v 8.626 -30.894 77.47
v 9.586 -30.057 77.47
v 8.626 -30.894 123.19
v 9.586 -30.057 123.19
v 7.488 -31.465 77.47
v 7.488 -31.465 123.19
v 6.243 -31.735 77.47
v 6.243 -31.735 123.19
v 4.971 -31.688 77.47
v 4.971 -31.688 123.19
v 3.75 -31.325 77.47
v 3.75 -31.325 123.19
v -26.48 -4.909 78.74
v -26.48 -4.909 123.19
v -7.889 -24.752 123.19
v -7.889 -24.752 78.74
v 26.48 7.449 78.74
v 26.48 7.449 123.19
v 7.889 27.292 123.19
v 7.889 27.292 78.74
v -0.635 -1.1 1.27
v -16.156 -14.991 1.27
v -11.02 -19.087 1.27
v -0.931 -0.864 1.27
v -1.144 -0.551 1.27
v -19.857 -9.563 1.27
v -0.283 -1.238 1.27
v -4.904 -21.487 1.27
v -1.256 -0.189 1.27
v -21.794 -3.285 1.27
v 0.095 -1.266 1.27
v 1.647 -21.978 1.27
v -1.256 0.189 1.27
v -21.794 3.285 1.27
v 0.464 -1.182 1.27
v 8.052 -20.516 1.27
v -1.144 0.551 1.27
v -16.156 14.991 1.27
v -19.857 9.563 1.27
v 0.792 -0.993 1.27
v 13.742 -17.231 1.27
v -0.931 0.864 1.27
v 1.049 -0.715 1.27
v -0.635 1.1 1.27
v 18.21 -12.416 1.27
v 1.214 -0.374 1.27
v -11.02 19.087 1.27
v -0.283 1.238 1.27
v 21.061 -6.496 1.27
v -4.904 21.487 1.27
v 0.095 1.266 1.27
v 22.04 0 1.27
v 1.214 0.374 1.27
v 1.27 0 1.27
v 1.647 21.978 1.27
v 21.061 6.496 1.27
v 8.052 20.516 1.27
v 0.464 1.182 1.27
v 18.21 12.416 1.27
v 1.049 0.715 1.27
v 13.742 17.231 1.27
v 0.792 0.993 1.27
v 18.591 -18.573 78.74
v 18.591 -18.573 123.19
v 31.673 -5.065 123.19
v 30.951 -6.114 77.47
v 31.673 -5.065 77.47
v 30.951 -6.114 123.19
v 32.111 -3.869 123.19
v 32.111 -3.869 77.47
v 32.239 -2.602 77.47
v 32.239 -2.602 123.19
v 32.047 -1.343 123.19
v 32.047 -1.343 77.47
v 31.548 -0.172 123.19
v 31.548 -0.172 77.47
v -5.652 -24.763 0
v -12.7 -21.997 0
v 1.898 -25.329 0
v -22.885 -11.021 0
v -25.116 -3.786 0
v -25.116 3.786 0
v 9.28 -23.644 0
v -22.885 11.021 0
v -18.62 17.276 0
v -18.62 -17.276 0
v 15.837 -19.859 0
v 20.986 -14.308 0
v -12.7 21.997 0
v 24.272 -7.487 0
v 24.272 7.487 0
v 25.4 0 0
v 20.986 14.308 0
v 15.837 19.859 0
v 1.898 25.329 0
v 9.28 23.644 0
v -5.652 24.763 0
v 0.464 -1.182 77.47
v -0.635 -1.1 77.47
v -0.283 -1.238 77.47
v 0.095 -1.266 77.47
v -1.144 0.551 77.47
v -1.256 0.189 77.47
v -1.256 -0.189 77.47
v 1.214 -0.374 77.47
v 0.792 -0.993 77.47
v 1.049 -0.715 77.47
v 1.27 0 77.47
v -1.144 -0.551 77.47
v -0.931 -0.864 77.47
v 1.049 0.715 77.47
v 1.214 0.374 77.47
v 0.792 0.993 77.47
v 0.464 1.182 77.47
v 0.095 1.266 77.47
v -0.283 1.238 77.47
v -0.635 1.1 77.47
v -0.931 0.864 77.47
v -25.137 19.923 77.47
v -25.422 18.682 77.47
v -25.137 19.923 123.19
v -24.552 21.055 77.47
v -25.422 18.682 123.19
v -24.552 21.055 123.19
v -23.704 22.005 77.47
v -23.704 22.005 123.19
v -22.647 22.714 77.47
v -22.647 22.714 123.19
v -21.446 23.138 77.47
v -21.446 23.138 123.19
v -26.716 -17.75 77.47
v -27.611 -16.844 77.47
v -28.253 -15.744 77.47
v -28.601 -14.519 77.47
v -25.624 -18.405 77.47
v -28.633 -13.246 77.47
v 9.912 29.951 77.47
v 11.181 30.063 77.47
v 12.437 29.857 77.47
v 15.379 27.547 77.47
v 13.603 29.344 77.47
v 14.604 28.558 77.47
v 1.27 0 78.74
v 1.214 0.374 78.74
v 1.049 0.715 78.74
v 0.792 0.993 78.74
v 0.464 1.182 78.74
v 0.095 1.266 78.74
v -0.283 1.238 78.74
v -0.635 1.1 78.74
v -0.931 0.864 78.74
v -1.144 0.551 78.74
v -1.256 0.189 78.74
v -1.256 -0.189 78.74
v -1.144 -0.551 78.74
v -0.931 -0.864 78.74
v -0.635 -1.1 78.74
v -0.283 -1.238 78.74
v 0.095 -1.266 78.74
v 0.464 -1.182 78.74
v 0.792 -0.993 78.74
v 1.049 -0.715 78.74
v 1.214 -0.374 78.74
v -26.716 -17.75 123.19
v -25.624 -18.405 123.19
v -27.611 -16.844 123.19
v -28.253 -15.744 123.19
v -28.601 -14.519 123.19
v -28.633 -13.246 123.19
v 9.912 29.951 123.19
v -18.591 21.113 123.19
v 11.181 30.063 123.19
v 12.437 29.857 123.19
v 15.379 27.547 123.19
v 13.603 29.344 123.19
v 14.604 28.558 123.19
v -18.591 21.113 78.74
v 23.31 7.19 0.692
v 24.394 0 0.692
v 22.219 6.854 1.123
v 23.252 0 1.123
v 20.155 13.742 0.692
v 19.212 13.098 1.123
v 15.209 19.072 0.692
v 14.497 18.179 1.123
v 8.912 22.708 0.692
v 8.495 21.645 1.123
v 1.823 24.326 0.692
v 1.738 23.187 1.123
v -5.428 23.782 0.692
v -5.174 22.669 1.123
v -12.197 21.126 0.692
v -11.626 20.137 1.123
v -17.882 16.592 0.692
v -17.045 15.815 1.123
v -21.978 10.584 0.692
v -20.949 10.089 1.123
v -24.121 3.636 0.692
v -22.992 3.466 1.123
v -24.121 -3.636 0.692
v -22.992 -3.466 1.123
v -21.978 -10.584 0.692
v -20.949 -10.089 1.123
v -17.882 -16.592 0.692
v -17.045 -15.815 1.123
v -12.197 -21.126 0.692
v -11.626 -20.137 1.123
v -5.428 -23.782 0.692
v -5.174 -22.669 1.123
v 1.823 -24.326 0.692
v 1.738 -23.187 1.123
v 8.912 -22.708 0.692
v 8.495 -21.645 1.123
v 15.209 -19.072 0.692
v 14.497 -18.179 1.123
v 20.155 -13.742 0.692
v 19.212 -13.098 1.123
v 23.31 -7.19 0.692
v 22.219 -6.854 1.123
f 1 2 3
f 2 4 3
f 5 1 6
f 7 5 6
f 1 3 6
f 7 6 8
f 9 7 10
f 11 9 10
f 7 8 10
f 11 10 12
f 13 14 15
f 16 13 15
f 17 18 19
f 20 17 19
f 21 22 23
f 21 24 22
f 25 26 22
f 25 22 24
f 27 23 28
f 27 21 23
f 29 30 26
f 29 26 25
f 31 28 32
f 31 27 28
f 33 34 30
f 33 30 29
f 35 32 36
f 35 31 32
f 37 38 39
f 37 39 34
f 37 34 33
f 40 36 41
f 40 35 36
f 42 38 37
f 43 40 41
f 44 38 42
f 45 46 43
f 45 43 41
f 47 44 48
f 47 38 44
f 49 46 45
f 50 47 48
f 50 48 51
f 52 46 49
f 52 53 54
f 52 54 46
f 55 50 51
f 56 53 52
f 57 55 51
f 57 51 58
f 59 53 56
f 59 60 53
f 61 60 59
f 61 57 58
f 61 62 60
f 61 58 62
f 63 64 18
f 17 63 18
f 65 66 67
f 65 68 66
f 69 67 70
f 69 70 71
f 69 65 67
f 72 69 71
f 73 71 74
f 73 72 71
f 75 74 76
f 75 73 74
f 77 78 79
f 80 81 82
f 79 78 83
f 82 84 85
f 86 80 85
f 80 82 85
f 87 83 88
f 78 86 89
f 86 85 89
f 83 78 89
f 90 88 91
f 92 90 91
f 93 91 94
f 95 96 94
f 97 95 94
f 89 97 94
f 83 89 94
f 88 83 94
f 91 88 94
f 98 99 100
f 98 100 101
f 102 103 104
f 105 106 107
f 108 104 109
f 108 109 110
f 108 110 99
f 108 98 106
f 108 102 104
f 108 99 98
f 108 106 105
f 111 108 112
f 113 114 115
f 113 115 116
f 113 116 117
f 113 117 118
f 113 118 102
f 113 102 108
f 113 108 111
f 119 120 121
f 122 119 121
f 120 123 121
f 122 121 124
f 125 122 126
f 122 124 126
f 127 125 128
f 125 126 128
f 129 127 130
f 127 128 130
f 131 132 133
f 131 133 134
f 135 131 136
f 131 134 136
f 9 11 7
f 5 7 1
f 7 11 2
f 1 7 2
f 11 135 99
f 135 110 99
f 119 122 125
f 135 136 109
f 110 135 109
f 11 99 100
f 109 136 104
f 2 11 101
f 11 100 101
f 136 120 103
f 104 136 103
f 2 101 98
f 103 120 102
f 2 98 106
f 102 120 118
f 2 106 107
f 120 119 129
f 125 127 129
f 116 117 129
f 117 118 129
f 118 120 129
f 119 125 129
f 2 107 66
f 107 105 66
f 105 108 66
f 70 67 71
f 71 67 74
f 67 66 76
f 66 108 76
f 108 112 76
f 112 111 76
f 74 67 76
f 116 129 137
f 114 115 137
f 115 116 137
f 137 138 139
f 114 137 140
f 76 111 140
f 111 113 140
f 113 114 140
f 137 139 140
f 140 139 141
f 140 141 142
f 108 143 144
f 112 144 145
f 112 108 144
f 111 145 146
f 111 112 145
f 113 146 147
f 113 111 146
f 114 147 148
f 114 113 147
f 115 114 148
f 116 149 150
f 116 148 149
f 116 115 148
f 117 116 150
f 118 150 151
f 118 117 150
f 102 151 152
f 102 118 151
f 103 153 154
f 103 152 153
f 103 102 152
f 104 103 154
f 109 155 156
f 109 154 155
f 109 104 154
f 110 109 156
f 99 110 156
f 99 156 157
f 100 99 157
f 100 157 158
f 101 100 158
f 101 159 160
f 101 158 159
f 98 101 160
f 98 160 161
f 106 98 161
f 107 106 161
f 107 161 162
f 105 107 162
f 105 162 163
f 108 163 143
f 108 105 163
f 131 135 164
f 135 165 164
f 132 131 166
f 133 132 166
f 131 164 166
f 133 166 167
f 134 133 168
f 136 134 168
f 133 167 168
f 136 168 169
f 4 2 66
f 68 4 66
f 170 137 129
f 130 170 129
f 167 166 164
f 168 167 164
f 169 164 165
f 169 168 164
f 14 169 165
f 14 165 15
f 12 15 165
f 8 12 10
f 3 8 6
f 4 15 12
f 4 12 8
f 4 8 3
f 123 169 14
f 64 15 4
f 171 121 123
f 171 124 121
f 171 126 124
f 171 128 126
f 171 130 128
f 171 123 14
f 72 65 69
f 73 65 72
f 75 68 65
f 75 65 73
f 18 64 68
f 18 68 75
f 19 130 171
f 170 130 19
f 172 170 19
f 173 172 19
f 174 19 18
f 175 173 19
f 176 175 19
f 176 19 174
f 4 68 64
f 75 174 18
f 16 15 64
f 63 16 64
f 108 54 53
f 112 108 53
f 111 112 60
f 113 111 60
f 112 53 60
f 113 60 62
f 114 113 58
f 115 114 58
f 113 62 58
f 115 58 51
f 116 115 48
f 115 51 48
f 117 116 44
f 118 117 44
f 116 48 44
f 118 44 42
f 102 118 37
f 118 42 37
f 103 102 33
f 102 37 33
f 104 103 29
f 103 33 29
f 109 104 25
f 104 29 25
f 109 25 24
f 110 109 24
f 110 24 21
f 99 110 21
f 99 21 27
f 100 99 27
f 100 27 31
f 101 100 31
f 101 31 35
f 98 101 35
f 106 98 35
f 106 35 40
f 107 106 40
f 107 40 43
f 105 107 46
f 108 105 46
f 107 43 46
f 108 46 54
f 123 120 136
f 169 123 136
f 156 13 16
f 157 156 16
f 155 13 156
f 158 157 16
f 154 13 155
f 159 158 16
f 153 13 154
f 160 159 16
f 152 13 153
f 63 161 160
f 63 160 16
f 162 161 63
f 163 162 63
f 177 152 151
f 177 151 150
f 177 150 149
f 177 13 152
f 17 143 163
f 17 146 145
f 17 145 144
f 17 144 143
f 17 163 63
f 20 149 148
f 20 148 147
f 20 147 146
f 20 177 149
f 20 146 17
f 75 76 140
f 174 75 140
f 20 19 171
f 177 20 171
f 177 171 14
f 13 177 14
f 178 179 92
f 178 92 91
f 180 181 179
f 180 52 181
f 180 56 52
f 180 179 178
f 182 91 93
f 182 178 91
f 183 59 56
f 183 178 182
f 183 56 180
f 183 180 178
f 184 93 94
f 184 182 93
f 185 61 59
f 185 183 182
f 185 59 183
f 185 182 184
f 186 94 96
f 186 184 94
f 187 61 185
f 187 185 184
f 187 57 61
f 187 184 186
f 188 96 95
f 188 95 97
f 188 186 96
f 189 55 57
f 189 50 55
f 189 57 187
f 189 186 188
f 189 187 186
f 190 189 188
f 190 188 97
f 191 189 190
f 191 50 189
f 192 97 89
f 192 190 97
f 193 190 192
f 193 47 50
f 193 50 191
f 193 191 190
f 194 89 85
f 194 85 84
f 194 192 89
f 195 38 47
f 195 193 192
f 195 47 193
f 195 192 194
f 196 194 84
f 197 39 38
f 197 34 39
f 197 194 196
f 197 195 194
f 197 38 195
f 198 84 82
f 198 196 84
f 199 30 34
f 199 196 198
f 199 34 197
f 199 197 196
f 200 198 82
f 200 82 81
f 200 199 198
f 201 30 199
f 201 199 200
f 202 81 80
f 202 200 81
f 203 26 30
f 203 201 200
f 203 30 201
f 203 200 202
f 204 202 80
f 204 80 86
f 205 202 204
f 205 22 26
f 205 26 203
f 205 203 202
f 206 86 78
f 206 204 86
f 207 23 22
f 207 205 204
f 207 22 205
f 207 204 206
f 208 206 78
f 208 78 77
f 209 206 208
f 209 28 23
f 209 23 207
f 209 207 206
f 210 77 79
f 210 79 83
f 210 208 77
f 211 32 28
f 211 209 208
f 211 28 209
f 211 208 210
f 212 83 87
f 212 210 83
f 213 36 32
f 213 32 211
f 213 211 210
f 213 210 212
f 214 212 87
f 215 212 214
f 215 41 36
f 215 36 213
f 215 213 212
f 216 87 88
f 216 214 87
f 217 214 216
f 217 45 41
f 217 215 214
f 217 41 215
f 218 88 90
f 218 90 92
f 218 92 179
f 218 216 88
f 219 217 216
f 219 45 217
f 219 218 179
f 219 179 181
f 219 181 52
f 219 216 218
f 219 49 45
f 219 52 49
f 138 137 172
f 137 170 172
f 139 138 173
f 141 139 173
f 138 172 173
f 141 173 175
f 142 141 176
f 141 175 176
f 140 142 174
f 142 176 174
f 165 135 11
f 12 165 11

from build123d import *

# Parameters (mm, degrees)
F0_R     = 25.4
F1_DEPTH = 1.27
F3_R     = 1.27
F4_DEPTH = 76.2
F5_R     = 1.27
F6_DEPTH = 45.72
F8_DEPTH = 44.45
F9_R     = 5.08
F10_R    = 5.08
F11_R    = 5.08
F12_R    = 5.08
F13_R    = 5.08


# Not quite as in the source:
# - a fillet or chamfer that OpenCascade refuses, or shapes differently, is made with other operations: its cross-section is extruded or revolved along the edge and cut away or added


with BuildPart() as f1:
    # F0 (on Top) → F1 (new body)
    with BuildSketch(Plane.XY):
        Circle(F0_R)
    extrude(amount=F1_DEPTH)

    # F2: fillet of radius 5.08 on 1 edges, made by hand

    # F2_s1 → F2_t2 (revolve, cut)
    with BuildSketch(Plane.XZ):
        with BuildLine():
            ThreePointArc((25.4, 0), (23.8359470592, 0.9419048812), (22.0398958349, 1.27))
            Line((22.0398958349, 1.27), (25.4, 1.27))
            Line((25.4, 1.27), (25.4, 0))
        make_face()
    revolve(axis=Axis((0, 0, 1.27), (0, 0, 1)), mode=Mode.SUBTRACT)

    # F3 (on face) → F4 (join)
    with BuildSketch(Plane.XY.offset(1.27)):
        Circle(F3_R)
    extrude(amount=F4_DEPTH)


with BuildPart() as f6:
    # F5 (on face) → F6 (new body)
    with BuildSketch(Plane.XY.offset(77.47)):
        Polygon((7.1284634836, -32.8111068162), (33.4080333046, -3.3596179632), (13.5188365959, 30.7347487257), (-25.0529328, 22.3547373114), (-29.0024005842, -16.9187612577), align=None)
        Circle(F5_R, mode=Mode.SUBTRACT)
    extrude(amount=F6_DEPTH)

    # F7 (on face) → F8 (cut)
    with BuildSketch(Plane.XY.offset(123.19)):
        Polygon((18.5908850385, -18.5730540045), (26.4800313758, 7.4486517199), (7.8891463373, 27.2917057244), (-18.5908850385, 21.1130540045), (-26.4800313758, -4.9086517199), (-7.8891463373, -24.7517057244), align=None)
    extrude(amount=-F8_DEPTH, mode=Mode.SUBTRACT)

    # F9
    f9_edges = [f6.edges().sort_by_distance(p)[0] for p in [
        (33.408033, -3.359618, 100.33),
    ]]
    fillet(f9_edges, radius=F9_R)

    # F10
    f10_edges = [f6.edges().sort_by_distance(p)[0] for p in [
        (7.128463, -32.811107, 100.33),
    ]]
    fillet(f10_edges, radius=F10_R)

    # F11
    f11_edges = [f6.edges().sort_by_distance(p)[0] for p in [
        (-29.002401, -16.918761, 100.33),
    ]]
    fillet(f11_edges, radius=F11_R)

    # F12
    f12_edges = [f6.edges().sort_by_distance(p)[0] for p in [
        (-25.052933, 22.354737, 100.33),
    ]]
    fillet(f12_edges, radius=F12_R)

    # F13
    f13_edges = [f6.edges().sort_by_distance(p)[0] for p in [
        (13.518837, 30.734749, 100.33),
    ]]
    fillet(f13_edges, radius=F13_R)


solid = Compound([f1.part, f6.part])
